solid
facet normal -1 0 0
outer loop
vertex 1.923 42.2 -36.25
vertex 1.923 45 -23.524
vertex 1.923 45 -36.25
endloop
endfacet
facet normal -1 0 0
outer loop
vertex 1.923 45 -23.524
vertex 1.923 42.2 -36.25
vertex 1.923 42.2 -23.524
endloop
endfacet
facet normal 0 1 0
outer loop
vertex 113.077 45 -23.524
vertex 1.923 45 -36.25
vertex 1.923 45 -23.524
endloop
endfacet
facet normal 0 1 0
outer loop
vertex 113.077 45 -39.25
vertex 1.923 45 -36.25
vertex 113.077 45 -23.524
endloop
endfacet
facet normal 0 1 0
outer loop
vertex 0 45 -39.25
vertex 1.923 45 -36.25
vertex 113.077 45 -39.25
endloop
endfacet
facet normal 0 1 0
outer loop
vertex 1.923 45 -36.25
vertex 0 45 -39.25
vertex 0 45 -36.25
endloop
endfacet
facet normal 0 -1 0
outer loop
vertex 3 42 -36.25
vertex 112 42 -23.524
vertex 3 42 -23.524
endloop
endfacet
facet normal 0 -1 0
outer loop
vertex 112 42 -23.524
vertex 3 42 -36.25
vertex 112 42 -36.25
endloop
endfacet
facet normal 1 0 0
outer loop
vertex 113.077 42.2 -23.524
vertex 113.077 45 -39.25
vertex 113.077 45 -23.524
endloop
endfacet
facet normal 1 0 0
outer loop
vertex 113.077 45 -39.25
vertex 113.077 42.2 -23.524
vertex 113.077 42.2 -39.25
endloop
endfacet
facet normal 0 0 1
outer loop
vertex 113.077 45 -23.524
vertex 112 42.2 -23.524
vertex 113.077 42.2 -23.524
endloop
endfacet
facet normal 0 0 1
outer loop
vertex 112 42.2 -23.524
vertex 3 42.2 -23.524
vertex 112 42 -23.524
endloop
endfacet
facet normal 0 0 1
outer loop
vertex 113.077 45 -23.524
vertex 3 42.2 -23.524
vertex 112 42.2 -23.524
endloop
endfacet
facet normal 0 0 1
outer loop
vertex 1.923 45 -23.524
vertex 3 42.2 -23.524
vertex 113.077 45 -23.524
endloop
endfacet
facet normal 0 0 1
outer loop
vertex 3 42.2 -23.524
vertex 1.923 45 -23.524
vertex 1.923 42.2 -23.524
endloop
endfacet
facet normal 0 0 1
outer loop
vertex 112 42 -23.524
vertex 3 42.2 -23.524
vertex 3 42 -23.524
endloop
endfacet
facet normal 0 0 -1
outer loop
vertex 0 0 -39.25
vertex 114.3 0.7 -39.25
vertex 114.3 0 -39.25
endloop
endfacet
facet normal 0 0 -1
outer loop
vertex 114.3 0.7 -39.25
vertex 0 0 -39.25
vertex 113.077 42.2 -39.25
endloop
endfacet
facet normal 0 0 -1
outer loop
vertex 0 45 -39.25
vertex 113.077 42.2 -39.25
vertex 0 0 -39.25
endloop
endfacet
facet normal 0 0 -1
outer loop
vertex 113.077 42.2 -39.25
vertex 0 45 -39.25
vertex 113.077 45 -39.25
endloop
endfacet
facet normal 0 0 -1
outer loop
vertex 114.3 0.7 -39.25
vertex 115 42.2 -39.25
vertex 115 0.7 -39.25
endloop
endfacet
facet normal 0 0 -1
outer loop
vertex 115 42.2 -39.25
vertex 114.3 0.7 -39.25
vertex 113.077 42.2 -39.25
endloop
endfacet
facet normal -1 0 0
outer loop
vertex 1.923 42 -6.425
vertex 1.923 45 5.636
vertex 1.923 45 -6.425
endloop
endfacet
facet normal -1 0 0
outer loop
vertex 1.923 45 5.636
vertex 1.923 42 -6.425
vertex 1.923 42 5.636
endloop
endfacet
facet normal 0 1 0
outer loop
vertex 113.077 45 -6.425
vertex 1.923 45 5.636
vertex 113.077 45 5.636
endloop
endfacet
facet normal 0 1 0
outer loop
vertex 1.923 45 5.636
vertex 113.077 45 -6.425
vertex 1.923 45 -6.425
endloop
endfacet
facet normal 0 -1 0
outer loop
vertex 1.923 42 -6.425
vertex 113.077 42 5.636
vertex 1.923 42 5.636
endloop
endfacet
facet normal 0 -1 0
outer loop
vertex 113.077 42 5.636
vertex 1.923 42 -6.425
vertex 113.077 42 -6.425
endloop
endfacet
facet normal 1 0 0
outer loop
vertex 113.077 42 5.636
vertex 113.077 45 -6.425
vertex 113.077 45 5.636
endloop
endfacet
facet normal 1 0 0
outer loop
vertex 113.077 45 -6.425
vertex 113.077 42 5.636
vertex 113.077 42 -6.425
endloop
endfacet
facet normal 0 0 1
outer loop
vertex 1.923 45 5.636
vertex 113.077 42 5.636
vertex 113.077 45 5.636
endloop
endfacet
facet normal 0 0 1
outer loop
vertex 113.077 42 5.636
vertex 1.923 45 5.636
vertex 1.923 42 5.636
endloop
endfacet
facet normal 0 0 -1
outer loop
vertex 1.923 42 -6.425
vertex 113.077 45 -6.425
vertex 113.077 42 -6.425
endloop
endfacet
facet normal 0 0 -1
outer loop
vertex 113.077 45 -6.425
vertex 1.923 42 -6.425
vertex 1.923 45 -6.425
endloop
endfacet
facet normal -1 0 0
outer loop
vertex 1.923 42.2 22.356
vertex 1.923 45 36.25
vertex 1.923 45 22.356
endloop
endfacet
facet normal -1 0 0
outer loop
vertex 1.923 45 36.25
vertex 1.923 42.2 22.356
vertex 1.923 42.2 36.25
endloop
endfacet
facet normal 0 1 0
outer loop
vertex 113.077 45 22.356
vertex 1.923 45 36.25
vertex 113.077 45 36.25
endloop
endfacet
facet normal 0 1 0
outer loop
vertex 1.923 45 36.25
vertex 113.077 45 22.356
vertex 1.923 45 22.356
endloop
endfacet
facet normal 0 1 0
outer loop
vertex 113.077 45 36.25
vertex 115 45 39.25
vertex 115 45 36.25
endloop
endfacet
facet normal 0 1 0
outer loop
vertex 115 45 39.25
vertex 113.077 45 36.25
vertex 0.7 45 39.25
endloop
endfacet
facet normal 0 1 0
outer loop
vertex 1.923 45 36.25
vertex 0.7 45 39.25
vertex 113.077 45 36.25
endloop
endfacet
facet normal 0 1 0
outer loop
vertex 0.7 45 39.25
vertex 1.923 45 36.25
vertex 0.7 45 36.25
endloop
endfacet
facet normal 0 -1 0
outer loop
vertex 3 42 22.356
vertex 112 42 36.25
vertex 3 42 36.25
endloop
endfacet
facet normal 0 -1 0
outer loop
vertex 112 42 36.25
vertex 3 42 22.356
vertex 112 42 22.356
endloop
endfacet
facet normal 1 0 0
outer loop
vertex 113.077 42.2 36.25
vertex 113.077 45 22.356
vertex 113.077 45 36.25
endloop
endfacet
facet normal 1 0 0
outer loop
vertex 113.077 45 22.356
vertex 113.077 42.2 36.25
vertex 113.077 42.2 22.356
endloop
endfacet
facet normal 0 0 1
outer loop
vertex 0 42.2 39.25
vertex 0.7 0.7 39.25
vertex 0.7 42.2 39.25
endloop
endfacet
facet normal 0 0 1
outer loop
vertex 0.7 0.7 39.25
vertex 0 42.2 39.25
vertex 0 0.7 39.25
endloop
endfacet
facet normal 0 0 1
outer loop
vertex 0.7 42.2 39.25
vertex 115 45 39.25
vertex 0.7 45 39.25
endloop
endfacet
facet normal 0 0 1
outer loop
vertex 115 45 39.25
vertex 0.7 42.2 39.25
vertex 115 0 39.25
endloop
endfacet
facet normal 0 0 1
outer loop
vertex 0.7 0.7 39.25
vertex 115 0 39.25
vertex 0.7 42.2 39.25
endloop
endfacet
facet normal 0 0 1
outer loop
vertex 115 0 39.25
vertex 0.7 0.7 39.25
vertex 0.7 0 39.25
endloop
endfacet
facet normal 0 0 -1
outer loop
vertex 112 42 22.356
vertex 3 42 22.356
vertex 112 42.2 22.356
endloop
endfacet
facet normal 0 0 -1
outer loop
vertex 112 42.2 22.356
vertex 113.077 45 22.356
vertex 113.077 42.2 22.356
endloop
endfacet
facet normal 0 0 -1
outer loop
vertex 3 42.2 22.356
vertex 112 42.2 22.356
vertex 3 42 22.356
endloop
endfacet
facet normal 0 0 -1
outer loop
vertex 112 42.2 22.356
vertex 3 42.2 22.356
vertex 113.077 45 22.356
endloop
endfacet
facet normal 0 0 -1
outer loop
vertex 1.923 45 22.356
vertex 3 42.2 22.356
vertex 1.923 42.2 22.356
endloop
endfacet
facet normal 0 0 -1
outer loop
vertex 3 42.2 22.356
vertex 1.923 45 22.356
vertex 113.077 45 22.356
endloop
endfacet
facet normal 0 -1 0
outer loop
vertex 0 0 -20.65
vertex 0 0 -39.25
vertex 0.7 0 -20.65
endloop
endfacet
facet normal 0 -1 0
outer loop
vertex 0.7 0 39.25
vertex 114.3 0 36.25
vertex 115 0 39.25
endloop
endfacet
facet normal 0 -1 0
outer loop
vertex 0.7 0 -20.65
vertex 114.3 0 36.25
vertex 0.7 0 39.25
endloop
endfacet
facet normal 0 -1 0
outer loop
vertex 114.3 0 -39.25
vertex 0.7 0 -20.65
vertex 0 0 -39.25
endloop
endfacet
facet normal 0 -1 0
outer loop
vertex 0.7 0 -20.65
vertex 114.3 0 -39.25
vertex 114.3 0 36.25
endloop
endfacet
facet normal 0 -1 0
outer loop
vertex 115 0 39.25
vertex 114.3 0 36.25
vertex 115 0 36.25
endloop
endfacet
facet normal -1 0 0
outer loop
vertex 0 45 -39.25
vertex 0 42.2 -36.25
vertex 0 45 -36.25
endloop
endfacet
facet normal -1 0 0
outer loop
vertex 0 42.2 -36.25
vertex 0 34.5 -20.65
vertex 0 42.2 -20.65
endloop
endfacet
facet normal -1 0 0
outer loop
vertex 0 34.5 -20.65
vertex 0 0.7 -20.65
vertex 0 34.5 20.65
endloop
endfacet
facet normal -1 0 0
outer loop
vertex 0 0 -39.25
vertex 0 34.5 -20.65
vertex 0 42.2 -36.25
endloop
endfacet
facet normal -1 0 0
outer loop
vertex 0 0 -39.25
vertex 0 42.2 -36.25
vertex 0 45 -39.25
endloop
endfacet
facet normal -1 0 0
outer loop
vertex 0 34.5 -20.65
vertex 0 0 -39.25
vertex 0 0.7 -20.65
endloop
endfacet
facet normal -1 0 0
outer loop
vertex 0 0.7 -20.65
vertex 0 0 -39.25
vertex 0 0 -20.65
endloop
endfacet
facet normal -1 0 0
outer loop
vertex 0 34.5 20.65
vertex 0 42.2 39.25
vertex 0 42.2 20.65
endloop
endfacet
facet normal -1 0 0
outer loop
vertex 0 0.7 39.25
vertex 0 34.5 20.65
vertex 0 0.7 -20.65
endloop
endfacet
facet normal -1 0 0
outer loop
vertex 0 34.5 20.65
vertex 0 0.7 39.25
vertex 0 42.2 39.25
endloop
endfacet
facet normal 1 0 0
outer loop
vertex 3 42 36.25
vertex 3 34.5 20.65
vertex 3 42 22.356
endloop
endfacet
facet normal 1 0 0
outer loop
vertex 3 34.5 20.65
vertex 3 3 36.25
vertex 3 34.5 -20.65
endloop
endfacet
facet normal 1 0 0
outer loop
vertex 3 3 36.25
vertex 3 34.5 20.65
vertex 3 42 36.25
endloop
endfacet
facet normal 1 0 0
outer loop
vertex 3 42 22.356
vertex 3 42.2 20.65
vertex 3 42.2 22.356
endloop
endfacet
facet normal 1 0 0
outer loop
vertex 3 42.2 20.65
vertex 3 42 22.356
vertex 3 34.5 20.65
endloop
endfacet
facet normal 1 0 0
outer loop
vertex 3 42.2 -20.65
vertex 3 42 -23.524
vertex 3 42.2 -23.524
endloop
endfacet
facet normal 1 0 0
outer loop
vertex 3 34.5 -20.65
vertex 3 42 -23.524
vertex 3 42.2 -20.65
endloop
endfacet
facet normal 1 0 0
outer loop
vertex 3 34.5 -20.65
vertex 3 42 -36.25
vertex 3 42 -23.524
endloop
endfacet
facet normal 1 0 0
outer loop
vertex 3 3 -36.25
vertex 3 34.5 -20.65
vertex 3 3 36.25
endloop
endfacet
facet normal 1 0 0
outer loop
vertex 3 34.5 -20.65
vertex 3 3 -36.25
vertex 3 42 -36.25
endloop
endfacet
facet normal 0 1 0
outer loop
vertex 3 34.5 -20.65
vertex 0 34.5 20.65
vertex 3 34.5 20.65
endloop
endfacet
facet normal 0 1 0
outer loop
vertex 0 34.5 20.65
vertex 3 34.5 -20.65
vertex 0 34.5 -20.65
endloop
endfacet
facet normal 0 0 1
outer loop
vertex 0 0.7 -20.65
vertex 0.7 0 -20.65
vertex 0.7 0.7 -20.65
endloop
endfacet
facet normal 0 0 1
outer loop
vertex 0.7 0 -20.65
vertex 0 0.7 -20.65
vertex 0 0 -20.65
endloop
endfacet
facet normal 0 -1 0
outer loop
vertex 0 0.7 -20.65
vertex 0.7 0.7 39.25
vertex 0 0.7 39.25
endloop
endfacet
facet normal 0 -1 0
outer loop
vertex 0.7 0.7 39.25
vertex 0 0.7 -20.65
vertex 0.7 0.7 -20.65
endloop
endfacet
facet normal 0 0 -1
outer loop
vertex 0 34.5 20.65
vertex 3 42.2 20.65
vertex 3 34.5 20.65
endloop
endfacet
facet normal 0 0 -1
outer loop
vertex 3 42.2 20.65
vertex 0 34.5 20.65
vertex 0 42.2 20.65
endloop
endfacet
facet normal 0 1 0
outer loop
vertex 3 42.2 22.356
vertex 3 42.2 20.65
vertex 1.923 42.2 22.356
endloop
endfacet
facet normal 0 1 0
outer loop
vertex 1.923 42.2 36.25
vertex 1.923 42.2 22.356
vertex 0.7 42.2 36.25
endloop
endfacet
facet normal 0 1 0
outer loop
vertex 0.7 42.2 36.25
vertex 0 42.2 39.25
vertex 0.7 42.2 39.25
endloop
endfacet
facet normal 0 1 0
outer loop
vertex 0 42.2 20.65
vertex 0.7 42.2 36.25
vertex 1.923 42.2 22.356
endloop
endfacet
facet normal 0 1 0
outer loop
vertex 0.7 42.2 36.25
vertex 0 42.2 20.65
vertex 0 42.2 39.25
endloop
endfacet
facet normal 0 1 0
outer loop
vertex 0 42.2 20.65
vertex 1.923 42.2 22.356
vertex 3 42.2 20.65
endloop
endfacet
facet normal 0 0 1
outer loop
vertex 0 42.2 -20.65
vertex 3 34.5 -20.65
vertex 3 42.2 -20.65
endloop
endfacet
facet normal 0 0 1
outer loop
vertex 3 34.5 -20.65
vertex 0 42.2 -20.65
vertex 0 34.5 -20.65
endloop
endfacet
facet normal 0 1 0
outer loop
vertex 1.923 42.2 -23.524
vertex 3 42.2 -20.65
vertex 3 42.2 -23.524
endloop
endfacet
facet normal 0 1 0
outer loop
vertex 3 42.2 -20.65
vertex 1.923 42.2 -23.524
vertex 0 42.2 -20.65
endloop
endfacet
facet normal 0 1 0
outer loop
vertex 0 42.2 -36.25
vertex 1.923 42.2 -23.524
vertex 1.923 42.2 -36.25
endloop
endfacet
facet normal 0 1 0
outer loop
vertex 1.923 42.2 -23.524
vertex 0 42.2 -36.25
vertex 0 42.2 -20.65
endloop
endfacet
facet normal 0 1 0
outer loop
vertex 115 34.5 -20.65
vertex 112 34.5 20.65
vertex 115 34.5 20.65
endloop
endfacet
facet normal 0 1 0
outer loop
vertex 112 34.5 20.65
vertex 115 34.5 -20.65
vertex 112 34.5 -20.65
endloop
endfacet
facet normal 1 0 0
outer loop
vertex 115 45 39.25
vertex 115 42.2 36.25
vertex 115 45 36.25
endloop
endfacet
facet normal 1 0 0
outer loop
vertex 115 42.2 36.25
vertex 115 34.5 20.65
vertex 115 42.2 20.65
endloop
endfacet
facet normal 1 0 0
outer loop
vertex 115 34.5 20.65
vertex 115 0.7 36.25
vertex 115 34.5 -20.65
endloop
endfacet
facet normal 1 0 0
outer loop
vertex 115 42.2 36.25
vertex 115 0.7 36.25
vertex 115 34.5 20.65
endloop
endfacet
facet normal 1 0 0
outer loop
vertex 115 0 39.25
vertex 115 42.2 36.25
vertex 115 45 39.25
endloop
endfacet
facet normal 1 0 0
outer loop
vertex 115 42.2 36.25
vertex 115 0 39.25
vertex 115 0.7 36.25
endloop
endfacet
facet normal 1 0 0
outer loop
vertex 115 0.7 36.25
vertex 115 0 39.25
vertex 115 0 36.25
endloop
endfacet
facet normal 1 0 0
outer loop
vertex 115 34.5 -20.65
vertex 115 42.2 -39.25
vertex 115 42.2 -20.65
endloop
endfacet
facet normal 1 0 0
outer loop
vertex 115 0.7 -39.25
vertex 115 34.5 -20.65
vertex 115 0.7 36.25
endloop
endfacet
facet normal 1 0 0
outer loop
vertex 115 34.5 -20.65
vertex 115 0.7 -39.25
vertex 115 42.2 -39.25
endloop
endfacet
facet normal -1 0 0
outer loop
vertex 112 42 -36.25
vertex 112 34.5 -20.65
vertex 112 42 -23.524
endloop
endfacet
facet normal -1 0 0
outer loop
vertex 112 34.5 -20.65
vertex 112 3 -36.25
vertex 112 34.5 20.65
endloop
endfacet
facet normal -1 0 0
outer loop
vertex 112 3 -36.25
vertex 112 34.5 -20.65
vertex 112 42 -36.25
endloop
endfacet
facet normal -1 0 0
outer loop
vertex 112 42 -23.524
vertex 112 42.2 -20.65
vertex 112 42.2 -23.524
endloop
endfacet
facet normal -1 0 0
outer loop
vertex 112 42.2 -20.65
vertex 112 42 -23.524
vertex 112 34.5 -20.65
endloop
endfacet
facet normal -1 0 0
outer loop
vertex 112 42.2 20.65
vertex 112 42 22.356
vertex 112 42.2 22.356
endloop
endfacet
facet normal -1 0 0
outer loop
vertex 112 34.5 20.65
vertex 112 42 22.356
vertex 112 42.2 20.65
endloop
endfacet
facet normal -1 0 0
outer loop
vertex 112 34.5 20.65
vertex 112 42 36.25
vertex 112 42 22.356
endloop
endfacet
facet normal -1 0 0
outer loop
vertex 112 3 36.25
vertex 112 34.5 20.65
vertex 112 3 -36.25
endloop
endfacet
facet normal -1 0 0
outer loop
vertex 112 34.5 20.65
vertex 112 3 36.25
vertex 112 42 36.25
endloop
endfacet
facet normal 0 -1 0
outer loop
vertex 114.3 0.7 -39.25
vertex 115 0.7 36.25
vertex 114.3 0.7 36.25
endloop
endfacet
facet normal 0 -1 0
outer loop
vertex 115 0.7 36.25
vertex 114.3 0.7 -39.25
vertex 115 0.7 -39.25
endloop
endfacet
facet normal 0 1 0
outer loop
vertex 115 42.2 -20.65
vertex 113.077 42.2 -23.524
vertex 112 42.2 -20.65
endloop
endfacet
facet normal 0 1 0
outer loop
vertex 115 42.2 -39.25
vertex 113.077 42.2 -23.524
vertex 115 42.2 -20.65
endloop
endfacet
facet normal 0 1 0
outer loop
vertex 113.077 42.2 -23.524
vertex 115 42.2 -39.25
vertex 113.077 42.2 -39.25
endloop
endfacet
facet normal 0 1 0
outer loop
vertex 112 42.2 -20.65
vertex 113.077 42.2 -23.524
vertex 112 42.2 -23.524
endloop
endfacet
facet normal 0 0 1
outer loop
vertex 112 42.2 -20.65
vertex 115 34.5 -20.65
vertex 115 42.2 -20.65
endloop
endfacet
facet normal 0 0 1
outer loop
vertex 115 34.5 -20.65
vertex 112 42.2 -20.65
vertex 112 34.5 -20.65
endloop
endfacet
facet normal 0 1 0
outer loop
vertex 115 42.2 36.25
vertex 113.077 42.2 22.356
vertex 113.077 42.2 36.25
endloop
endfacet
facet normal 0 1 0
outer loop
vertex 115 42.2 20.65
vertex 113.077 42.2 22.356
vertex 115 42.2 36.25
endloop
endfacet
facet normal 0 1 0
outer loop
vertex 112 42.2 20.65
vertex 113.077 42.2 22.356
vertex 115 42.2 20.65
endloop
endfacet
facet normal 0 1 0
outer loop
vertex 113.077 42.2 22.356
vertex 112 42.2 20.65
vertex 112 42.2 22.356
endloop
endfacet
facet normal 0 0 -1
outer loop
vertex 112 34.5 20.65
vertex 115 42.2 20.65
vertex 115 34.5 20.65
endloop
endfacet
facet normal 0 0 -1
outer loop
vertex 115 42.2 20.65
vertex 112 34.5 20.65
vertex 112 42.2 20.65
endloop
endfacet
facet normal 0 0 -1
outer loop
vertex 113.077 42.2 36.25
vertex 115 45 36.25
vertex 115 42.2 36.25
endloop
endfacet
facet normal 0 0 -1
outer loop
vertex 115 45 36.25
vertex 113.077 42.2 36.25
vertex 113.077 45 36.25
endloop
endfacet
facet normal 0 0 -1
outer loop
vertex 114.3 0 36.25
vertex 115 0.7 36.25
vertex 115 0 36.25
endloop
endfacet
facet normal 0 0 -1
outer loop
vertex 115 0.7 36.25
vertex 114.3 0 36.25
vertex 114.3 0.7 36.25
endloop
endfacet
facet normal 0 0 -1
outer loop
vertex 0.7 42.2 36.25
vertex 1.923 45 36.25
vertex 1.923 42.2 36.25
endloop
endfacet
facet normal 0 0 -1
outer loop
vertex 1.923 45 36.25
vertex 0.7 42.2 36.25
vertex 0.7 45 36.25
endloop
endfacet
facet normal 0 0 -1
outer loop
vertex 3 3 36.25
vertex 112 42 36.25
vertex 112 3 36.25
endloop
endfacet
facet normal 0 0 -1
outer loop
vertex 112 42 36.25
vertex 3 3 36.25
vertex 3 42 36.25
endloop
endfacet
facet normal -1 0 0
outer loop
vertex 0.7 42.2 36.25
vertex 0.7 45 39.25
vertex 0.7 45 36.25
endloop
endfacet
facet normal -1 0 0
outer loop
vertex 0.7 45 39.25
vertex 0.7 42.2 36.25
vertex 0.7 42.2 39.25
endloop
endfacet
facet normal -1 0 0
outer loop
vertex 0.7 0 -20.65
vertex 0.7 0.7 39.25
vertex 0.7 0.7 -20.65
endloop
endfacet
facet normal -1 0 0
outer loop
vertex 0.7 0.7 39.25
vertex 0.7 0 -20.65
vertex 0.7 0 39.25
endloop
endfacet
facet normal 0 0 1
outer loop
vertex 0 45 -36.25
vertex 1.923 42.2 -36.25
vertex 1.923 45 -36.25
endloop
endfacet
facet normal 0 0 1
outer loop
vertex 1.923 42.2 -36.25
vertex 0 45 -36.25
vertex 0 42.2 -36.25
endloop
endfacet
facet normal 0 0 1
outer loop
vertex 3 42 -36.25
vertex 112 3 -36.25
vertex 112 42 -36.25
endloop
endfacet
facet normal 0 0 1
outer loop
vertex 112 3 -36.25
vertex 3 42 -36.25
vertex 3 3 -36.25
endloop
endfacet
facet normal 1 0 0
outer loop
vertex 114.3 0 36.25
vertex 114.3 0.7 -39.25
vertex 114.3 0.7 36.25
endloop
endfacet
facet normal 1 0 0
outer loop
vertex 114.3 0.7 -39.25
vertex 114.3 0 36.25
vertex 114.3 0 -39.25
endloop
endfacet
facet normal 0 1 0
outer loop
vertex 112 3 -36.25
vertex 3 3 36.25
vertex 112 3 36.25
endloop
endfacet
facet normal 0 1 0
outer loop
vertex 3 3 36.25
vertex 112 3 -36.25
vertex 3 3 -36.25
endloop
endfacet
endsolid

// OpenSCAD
% scale(1000) import("ffld_0850ncn30_lksr00_0__6.part");

// Sketch PureShapes 3
multmatrix([[1.0, 0.0, 0.0, 0.0], [0.0, 1.0, 0.0, 0.0], [0.0, 0.0, 1.0, 39.25], [0.0, 0.0, 0.0, 1.0]]) {
thickness = 3.000000;
translate([0, 0, -thickness]) {
  translate([0.700000, 0.000000, 0]) {
    rotate([0, 0, 0.0]) {
      cube([114.300000, 45.000000, thickness]);
    }
  }
}
}

// Sketch PureShapes 3
multmatrix([[1.0, 0.0, 0.0, 0.0], [0.0, -1.0, 0.0, 0.0], [0.0, 0.0, -1.0, -39.25], [0.0, 0.0, 0.0, 1.0]]) {
thickness = 3.000000;
translate([0, 0, -thickness]) {
  translate([113.077033, 0.000000, 0]) {
    rotate([0, 0, 180.0]) {
      cube([113.077033, 45.000000, thickness]);
    }
  }
}
}

// Sketch PureShapes 3
multmatrix([[-1.0, 0.0, 0.0, 0.0], [0.0, 0.0, 1.0, 45.0], [0.0, 1.0, 0.0, 0.0], [0.0, 0.0, 0.0, 1.0]]) {
thickness = 3.000000;
translate([0, 0, -thickness]) {
  translate([-113.077033, -39.250000, 0]) {
    rotate([0, 0, 0.0]) {
      cube([111.154066, 15.725698, thickness]);
    }
  }
  translate([-113.077033, -6.425000, 0]) {
    rotate([0, 0, 0.0]) {
      cube([111.154066, 12.061041, thickness]);
    }
  }
  translate([-113.077033, 22.356064, 0]) {
    rotate([0, 0, 0.0]) {
      cube([111.154066, 16.893936, thickness]);
    }
  }
}
}

// Sketch PureShapes 3
multmatrix([[0.0, 0.0, -1.0, 0.0], [-1.0, 0.0, 0.0, 0.0], [0.0, 1.0, 0.0, 0.0], [0.0, 0.0, 0.0, 1.0]]) {
thickness = 3.000000;
translate([0, 0, -thickness]) {
  translate([-34.500000, -39.250000, 0]) {
    rotate([0, 0, 0.0]) {
      cube([34.500000, 18.600000, thickness]);
    }
  }
  translate([-34.500000, -20.650000, 0]) {
    rotate([0, 0, 0.0]) {
      cube([33.800000, 41.300000, thickness]);
    }
  }
  translate([-0.700000, 39.250000, 0]) {
    rotate([0, 0, 180.0]) {
      cube([33.800000, 18.600000, thickness]);
    }
  }
  translate([-34.500000, 39.250000, 0]) {
    rotate([0, 0, 180.0]) {
      cube([7.700000, 18.600000, thickness]);
    }
  }
  translate([-34.500000, -20.650000, 0]) {
    rotate([0, 0, 180.0]) {
      cube([7.700000, 18.600000, thickness]);
    }
  }
}
}

// Sketch PureShapes 3
multmatrix([[0.0, 0.0, 1.0, 115.0], [1.0, 0.0, 0.0, 0.0], [0.0, 1.0, 0.0, 0.0], [0.0, 0.0, 0.0, 1.0]]) {
thickness = 3.000000;
translate([0, 0, -thickness]) {
  translate([0.700000, 20.650000, 0]) {
    rotate([0, 0, 0.0]) {
      cube([33.800000, 18.600000, thickness]);
    }
  }
  translate([34.500000, 20.650000, 0]) {
    rotate([0, 0, 180.0]) {
      cube([33.800000, 41.300000, thickness]);
    }
  }
  translate([0.700000, -39.250000, 0]) {
    rotate([0, 0, 0.0]) {
      cube([33.800000, 18.600000, thickness]);
    }
  }
  translate([34.500000, -39.250000, 0]) {
    rotate([0, 0, 0.0]) {
      cube([7.700000, 18.600000, thickness]);
    }
  }
  translate([34.500000, 20.650000, 0]) {
    rotate([0, 0, 0.0]) {
      cube([7.700000, 18.600000, thickness]);
    }
  }
}
}

// Sketch PureShapes 3
multmatrix([[1.0, 0.0, 0.0, 0.0], [0.0, 0.0, -1.0, 0.0], [0.0, 1.0, 0.0, 0.0], [0.0, 0.0, 0.0, 1.0]]) {
thickness = 3.000000;
translate([0, 0, -thickness]) {
  translate([114.300000, 39.250000, 0]) {
    rotate([0, 0, 180.0]) {
      cube([113.600000, 78.500000, thickness]);
    }
  }
}
}
